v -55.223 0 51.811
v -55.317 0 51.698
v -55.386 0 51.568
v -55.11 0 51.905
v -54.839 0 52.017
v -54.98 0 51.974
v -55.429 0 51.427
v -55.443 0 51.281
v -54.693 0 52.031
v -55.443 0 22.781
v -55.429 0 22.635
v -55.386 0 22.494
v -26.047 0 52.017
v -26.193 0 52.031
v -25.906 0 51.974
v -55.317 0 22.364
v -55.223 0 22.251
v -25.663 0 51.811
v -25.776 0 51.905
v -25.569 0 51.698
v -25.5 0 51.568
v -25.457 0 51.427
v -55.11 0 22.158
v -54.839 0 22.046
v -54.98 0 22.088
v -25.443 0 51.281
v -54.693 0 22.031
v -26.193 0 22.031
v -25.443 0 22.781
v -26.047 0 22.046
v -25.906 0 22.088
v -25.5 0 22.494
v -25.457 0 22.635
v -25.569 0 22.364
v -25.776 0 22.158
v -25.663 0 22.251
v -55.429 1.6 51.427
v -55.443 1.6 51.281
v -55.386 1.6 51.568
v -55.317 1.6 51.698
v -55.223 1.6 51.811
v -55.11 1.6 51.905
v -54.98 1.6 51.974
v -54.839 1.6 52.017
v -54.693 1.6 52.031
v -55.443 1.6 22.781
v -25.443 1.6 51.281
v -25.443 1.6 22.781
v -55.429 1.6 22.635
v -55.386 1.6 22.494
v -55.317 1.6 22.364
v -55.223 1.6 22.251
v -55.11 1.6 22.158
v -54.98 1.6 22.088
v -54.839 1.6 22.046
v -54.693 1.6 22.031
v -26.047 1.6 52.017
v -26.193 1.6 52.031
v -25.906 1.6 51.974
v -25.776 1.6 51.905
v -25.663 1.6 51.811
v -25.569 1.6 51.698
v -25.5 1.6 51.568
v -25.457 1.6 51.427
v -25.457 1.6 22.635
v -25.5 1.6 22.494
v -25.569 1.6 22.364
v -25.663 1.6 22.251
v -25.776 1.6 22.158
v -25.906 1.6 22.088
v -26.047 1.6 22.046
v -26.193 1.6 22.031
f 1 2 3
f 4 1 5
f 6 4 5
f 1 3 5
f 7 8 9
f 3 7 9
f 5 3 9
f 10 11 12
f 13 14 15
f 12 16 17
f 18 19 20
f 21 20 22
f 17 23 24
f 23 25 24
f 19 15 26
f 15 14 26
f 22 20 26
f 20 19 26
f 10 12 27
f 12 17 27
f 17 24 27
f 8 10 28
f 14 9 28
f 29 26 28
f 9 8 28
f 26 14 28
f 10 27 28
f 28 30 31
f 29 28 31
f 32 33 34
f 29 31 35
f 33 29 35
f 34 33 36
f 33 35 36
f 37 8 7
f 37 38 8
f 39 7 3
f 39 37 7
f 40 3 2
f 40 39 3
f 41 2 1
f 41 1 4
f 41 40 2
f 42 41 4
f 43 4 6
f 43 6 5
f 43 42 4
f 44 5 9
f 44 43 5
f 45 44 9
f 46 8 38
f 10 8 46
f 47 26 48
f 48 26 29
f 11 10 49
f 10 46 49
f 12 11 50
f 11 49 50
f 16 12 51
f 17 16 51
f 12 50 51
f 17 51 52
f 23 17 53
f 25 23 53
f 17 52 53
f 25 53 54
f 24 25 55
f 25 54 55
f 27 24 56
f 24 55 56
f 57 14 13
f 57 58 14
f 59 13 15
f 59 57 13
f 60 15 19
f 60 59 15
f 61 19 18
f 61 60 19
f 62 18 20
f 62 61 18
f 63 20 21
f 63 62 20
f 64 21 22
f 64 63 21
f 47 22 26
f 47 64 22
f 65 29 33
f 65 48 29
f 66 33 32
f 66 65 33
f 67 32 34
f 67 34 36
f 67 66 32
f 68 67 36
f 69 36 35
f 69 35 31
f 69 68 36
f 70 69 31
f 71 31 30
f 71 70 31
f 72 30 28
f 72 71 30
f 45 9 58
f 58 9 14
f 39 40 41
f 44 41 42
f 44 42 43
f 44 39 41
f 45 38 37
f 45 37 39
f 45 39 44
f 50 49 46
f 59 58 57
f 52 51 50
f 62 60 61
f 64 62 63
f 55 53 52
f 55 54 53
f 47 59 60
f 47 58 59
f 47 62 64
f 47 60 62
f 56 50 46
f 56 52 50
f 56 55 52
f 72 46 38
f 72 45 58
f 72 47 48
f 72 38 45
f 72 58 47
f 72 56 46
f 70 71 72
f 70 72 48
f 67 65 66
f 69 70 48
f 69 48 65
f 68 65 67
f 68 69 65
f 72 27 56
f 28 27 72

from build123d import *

# Parameters (mm, degrees)
SCHIZZO1_W                   = 30
SCHIZZO1_H                   = 30
ESTRUSIONE_ESTRUSIONE1_DEPTH = 1.6
RACCORDO1_R                  = 0.75


with BuildPart() as part:
    # Schizzo1 → Estrusione-Estrusione1 (new body)
    with BuildSketch(Plane(origin=(0, 0, 0), x_dir=(1, 0, 0), z_dir=(0, 1, 0))):
        with Locations((-40.4430411, -37.031161648)):
            Rectangle(SCHIZZO1_W, SCHIZZO1_H)
    extrude(amount=ESTRUSIONE_ESTRUSIONE1_DEPTH)

    # Raccordo1
    raccordo1_edges = [part.edges().sort_by_distance(p)[0] for p in [
        (-55.4430411, 0.8, 22.031161648),
        (-25.4430411, 0.8, 22.031161648),
        (-25.4430411, 0.8, 52.031161648),
        (-55.4430411, 0.8, 52.031161648),
    ]]
    fillet(raccordo1_edges, radius=RACCORDO1_R)


solid = part.part
